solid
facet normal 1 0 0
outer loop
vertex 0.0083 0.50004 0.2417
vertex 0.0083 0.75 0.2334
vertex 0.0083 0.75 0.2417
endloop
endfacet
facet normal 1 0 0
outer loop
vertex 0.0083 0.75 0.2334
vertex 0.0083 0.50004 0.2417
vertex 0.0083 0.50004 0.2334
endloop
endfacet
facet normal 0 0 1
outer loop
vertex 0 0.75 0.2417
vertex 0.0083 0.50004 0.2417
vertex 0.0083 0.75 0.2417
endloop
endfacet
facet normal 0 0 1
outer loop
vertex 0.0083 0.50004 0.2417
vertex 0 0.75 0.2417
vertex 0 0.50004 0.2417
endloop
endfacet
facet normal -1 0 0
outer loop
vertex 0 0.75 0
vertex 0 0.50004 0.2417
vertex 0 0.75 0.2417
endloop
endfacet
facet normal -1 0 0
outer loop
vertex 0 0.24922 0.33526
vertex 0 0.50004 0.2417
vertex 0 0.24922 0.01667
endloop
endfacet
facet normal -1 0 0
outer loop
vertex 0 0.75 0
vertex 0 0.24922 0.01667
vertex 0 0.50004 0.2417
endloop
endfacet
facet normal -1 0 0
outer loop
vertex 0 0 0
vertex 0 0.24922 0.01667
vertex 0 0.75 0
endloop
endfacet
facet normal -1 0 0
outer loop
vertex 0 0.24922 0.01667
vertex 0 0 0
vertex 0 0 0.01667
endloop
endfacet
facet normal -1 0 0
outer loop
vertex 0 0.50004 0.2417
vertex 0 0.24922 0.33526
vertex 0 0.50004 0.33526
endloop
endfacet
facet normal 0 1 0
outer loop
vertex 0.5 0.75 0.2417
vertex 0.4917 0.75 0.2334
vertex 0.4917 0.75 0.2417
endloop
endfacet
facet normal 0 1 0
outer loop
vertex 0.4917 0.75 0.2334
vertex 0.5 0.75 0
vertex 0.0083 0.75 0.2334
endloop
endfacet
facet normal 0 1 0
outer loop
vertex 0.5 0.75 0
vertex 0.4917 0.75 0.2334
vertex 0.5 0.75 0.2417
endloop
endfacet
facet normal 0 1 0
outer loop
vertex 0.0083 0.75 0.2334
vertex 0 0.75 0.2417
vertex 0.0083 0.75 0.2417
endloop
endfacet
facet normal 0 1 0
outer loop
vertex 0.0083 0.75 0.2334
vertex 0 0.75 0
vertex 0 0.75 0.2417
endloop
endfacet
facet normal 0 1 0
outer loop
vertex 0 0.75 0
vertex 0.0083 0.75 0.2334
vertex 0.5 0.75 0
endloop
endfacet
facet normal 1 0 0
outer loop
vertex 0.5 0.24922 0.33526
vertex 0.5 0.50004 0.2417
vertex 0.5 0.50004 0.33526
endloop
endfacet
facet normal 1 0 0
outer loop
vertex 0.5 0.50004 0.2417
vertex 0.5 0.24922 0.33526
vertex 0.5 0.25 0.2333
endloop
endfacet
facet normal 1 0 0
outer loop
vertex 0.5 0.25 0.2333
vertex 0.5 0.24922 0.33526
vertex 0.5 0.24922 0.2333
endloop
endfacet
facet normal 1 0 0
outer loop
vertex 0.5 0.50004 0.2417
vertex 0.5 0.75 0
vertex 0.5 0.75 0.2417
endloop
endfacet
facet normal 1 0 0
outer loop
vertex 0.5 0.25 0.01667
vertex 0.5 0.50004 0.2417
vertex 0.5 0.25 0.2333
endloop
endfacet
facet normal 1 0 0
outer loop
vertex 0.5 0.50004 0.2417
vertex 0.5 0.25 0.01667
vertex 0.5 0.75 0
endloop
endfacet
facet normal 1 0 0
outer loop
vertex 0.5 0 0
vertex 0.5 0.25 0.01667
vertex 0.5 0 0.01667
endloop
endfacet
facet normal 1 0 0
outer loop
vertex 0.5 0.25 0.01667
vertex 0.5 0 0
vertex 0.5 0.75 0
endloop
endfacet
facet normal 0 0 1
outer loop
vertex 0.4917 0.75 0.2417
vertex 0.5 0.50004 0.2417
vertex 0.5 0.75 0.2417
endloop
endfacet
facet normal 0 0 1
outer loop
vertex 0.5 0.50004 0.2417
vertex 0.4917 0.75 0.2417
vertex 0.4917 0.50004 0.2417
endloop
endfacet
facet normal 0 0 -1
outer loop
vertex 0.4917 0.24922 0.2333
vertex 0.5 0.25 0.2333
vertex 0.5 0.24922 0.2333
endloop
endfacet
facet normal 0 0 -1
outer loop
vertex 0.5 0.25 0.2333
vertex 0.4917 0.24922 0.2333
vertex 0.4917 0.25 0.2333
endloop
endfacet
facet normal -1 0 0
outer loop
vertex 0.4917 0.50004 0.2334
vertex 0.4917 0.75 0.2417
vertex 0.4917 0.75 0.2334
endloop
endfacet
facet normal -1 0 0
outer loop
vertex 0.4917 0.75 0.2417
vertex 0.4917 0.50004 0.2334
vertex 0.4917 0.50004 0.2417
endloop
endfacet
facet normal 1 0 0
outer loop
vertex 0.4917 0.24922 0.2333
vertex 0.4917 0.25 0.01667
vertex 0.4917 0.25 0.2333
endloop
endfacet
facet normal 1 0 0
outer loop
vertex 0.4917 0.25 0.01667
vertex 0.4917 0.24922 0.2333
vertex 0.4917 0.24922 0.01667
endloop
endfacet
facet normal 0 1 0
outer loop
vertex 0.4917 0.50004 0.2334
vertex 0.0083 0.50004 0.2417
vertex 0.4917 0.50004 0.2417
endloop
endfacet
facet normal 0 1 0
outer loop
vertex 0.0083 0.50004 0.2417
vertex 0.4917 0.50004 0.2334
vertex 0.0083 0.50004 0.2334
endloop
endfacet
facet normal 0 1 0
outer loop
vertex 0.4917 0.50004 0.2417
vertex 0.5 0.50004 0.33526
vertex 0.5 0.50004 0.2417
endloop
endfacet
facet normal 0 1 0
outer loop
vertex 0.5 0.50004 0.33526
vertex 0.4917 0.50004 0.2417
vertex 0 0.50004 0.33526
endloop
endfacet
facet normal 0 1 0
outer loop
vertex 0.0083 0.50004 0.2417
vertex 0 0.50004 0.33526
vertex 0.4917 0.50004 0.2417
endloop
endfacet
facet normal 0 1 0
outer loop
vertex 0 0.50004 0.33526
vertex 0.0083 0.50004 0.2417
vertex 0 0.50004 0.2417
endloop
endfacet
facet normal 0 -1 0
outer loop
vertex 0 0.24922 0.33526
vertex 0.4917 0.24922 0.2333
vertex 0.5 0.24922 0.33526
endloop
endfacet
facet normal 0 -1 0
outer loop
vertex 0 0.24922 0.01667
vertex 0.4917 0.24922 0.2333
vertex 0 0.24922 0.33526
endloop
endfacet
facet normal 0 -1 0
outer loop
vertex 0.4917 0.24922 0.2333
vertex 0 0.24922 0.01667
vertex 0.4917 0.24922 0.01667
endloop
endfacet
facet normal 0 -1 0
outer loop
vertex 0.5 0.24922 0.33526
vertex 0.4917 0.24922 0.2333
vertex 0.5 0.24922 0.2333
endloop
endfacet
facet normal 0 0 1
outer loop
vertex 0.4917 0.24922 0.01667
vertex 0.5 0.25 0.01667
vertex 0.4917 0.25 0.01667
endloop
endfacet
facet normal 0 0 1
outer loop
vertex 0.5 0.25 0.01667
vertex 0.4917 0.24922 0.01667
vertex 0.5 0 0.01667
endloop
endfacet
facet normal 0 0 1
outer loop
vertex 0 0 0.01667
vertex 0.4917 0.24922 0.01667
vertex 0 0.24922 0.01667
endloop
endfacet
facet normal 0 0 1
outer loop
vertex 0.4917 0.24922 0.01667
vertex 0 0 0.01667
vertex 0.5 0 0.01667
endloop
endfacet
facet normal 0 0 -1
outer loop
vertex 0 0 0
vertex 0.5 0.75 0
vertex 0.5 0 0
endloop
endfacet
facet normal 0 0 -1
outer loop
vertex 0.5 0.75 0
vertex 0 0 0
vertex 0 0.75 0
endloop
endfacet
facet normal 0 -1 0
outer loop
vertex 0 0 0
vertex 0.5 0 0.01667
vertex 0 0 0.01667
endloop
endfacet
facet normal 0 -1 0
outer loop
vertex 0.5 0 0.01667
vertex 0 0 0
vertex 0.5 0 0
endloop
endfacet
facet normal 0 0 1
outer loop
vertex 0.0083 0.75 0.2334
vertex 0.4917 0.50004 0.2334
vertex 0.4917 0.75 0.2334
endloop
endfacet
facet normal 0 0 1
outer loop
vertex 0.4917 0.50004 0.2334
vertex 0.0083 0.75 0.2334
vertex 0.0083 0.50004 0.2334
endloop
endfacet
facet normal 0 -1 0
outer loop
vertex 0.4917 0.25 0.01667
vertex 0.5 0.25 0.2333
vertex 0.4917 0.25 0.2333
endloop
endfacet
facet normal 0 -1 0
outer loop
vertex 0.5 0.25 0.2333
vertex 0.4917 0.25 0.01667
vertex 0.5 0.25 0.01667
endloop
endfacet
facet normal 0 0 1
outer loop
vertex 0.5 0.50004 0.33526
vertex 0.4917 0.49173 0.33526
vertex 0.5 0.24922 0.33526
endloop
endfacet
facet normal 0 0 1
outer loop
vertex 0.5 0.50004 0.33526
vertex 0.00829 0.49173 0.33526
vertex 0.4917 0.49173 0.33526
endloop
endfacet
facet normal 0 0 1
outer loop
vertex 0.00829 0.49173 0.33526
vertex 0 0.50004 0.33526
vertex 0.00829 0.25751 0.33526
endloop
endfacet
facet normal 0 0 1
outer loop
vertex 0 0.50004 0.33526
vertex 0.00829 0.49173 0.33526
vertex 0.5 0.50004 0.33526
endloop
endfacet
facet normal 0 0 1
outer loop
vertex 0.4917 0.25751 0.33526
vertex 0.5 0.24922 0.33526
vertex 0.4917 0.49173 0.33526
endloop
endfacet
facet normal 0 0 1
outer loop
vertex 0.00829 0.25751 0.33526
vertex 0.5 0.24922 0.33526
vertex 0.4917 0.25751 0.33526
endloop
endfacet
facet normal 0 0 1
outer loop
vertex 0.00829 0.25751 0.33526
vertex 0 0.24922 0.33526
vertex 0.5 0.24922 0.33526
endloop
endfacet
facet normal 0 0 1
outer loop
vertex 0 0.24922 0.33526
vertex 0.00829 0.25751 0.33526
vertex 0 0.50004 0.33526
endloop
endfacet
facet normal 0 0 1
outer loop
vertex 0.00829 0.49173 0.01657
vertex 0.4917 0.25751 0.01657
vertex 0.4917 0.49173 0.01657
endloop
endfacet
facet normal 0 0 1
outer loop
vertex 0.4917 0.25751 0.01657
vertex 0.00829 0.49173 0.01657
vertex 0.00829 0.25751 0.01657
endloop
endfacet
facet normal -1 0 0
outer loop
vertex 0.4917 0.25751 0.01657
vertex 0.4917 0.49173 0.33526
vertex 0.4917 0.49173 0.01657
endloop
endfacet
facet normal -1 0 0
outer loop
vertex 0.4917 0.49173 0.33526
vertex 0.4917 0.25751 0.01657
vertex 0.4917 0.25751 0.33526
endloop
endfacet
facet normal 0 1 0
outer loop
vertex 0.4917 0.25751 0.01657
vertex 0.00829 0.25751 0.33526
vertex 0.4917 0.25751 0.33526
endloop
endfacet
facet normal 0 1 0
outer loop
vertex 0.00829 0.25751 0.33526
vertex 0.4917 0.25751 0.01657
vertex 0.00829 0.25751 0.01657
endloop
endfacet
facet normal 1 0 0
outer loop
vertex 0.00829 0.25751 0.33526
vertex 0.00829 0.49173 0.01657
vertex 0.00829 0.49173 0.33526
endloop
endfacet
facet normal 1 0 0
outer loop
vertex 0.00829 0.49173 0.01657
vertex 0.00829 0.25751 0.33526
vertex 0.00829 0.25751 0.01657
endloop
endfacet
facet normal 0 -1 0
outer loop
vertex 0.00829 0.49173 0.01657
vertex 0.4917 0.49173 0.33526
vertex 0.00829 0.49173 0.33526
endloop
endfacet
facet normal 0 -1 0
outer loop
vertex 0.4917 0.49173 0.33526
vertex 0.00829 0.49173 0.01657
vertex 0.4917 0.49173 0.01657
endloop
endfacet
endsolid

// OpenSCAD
$fn = 64;
eps = 0.0001;

// Parameters
base_length = 0.5;
base_width = 0.75;
base_height = 0.016667;        // main extrusion depth ~= 0.0167

rear_feature_length = base_length;
rear_feature_width = 0.5;
rear_feature_front_offset = base_width - rear_feature_width;
rear_feature_reach = 0.2334;

edge_strip_width = 0.0083;
edge_strip_length = rear_feature_width;
edge_strip_height = 0.0083;
edge_strip_opposite_offset = 0.4917;

transverse_length = base_length;
transverse_front_offset = 0.24922;
transverse_back_offset = 0.249961;
transverse_width = base_width - transverse_front_offset - transverse_back_offset;
transverse_thickness = 0.0021;
transverse_reach = 0.335265;
transverse_z = transverse_reach - transverse_thickness;

step_shoulder_z = rear_feature_reach;
upper_pad_depth = 0.1;
lower_continuation_depth = 0.2167;
lower_continuation_length = edge_strip_opposite_offset;
lower_continuation_width = transverse_width;

internal_wall_x = edge_strip_width;
internal_wall_y = edge_strip_width;
internal_void_x = internal_wall_x;
internal_void_y = transverse_front_offset + internal_wall_y;
internal_void_length = transverse_length - 2 * internal_wall_x;
internal_void_width = transverse_width - 2 * internal_wall_y;
internal_void_z = base_height - eps;
internal_void_height = transverse_reach - base_height + 2 * eps;

internal_void_points = [
    [internal_void_x, internal_void_y],
    [internal_void_x + internal_void_length, internal_void_y],
    [internal_void_x + internal_void_length, internal_void_y + internal_void_width],
    [internal_void_x, internal_void_y + internal_void_width]
];

// Helper
module cuboid_at(x, y, z, sx, sy, sz) {
    translate([x, y, z])
        cube([sx, sy, sz], center=false);
}

// Base slab
module base_slab() {
    cuboid_at(0, 0, 0, base_length, base_width, base_height);
}

// Rear raised rectangular feature
module rear_feature() {
    cuboid_at(
        0,
        rear_feature_front_offset,
        base_height - eps,
        rear_feature_length,
        rear_feature_width,
        rear_feature_reach - base_height + eps
    );
}

// Narrow left and right upper edge strips
module edge_strips() {
    cuboid_at(
        0,
        rear_feature_front_offset,
        step_shoulder_z - eps,
        edge_strip_width,
        edge_strip_length,
        edge_strip_height + eps
    );

    cuboid_at(
        edge_strip_opposite_offset,
        rear_feature_front_offset,
        step_shoulder_z - eps,
        edge_strip_width,
        edge_strip_length,
        edge_strip_height + eps
    );
}

// Aligned stepped portion
module stepped_portion() {
    union() {
        // Deeper continuation measured from the same shoulder
        cuboid_at(
            0,
            transverse_front_offset,
            step_shoulder_z - lower_continuation_depth - eps,
            lower_continuation_length,
            lower_continuation_width,
            lower_continuation_depth + eps
        );

        // Upper pad
        cuboid_at(
            0,
            transverse_front_offset,
            step_shoulder_z - eps,
            transverse_length,
            transverse_width,
            upper_pad_depth + eps
        );
    }
}

// Thin transverse top feature
module transverse_cap() {
    cuboid_at(
        0,
        transverse_front_offset,
        transverse_z,
        transverse_length,
        transverse_width,
        transverse_thickness
    );
}

// Closed internal profile cut as a real void
module internal_profile_void() {
    translate([0, 0, internal_void_z])
        linear_extrude(height=internal_void_height, center=false, convexity=4)
            polygon(points=internal_void_points);
}

// Main model
difference() {
    union() {
        base_slab();
        rear_feature();
        edge_strips();
        stepped_portion();
        transverse_cap();
    }

    internal_profile_void();
}
